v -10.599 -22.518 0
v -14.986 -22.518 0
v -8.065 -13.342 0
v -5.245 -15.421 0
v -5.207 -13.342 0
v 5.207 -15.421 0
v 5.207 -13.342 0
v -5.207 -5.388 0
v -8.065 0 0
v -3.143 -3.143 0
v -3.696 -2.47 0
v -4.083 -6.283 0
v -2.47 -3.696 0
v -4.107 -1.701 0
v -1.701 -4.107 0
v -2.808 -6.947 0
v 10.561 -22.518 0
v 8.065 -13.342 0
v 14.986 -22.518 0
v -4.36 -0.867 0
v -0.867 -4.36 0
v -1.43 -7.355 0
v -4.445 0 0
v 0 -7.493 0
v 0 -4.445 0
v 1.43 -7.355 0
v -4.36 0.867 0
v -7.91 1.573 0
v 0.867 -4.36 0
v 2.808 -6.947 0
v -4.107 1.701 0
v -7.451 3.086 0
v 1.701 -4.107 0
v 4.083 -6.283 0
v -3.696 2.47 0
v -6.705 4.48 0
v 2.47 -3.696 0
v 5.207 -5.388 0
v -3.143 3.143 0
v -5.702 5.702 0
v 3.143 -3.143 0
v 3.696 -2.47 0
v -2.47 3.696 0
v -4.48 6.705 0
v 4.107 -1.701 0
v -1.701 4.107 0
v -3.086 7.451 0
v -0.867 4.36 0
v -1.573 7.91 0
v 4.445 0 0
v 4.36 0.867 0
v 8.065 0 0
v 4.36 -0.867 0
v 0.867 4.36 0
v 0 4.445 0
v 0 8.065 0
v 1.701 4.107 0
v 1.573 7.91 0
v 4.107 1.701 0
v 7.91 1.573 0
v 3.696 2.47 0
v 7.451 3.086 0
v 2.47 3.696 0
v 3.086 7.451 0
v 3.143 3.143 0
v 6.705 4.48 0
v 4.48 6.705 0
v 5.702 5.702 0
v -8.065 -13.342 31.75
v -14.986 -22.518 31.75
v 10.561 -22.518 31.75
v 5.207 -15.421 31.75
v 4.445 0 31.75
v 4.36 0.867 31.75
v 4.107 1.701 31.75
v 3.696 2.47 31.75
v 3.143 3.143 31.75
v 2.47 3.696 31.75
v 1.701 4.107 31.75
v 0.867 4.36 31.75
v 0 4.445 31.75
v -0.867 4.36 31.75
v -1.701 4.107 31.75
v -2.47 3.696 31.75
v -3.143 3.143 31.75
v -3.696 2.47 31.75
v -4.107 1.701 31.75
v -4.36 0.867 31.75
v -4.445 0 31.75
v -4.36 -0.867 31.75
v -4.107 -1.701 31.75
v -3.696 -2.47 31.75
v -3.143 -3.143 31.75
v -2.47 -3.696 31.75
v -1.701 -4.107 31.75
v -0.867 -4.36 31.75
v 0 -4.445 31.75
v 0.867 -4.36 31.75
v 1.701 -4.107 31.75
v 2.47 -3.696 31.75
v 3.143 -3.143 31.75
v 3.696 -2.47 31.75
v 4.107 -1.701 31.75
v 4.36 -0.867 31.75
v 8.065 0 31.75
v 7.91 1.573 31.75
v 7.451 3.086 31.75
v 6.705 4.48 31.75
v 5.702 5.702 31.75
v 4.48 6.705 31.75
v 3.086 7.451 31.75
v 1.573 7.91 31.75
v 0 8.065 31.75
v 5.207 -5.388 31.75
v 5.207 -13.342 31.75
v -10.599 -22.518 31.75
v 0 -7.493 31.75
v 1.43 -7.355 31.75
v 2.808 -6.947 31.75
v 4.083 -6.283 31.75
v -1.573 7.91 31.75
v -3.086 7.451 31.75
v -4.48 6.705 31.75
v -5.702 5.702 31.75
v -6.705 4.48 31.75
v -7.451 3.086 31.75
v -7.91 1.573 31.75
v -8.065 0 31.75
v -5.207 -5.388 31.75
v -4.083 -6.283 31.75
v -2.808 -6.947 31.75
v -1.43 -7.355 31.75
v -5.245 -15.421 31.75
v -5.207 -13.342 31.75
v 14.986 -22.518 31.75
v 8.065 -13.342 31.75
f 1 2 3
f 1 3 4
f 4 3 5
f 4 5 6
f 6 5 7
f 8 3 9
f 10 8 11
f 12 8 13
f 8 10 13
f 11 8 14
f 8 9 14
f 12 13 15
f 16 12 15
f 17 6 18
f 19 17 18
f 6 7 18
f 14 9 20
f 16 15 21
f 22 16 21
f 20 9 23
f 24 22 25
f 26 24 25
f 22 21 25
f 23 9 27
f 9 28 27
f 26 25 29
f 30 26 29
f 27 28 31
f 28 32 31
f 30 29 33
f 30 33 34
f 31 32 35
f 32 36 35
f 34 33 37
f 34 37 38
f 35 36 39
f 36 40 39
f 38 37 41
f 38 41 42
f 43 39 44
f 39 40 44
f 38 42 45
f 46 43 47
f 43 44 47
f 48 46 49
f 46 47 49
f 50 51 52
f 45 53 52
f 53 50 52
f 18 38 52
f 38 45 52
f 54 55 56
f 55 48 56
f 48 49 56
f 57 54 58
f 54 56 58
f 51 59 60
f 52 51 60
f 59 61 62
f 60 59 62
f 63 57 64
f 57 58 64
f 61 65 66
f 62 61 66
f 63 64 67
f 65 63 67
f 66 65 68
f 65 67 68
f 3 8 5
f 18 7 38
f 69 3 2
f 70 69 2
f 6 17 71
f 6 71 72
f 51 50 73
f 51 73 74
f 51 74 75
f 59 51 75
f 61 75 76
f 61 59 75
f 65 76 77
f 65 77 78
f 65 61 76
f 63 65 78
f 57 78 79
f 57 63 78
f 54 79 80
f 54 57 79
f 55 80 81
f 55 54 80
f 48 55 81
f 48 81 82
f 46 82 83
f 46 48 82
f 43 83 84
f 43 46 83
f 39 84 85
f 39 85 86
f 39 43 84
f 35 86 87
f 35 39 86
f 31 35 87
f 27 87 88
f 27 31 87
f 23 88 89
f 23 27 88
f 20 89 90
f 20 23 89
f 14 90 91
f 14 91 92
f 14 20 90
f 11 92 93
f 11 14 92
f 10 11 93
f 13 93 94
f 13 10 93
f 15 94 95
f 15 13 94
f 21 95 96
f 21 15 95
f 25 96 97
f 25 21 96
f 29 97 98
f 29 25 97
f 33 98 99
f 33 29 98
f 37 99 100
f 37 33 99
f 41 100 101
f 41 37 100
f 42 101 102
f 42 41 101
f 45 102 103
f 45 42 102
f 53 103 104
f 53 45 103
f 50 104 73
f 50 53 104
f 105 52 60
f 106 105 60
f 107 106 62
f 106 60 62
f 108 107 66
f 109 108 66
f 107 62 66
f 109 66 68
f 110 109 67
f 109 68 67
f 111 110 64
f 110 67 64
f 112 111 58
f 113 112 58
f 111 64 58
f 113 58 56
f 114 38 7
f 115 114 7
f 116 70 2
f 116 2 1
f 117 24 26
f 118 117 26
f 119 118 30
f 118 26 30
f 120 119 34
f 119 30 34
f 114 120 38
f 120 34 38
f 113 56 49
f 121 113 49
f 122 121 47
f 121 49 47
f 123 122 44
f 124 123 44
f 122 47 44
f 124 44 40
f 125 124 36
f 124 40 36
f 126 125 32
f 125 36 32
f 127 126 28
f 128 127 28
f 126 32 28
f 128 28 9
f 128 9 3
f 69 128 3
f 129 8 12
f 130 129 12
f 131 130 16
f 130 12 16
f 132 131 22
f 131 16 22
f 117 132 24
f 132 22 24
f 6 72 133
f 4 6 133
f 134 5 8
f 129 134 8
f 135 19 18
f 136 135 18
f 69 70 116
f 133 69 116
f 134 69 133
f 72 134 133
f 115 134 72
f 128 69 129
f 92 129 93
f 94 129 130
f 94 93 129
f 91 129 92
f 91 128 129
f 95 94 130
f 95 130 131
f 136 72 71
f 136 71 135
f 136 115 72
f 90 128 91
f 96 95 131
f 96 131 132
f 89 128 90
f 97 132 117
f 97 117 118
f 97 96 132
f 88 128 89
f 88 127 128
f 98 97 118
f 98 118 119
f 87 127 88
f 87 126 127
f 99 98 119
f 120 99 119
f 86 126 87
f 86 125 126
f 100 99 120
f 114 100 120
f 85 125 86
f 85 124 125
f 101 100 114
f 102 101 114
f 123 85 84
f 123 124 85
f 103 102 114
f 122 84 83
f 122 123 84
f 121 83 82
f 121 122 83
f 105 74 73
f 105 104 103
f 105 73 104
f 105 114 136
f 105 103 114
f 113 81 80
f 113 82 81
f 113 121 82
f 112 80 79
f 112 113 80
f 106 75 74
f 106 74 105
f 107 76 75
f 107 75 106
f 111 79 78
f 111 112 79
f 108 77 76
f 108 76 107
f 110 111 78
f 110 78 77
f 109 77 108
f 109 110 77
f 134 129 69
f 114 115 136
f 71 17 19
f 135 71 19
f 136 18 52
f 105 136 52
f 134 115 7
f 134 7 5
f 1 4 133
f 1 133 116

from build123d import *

# Parameters (mm, degrees)
F0_R     = 4.445
F1_DEPTH = 31.75
F3_DEPTH = 31.751


with BuildPart() as f1:
    # F0 (on Top) → F1 (new body)
    with BuildSketch(Plane.XY):
        with BuildLine():
            ThreePointArc((8.0645, 0), (5.702463, 5.702463), (0, 8.0645))
            ThreePointArc((0, 8.0645), (-5.702463, 5.702463), (-8.0645, 0))
            Line((-8.0645, 0), (-8.0645, -13.342164))
            Line((-8.0645, -13.342164), (-14.986, -22.517859))
            Line((-14.986, -22.517859), (0, -22.517859))
            Line((0, -22.517859), (14.986, -22.517859))
            Line((14.986, -22.517859), (8.0645, -13.342164))
            Line((8.0645, -13.342164), (8.0645, 0))
        make_face()
        with BuildLine():
            Line((0, -13.342164), (-5.207, -13.342164))
            Line((-5.207, -13.342164), (-5.207, -5.388154))
            ThreePointArc((-5.207, -5.388154), (-2.808168, -6.946887), (0, -7.493))
            ThreePointArc((0, -7.493), (2.808168, -6.946887), (5.207, -5.388154))
            Line((5.207, -5.388154), (5.207, -13.342164))
            Line((5.207, -13.342164), (0, -13.342164))
        make_face(mode=Mode.SUBTRACT)
        Circle(F0_R, mode=Mode.SUBTRACT)
    extrude(amount=F1_DEPTH)

    # F2 (on face) → F3 (cut, through all)
    with BuildSketch(Plane.XY.offset(31.75)):
        Polygon((5.207, -15.420636), (-5.2451, -15.420636), (-10.598746, -22.517859), (10.560646, -22.517859), align=None)
    extrude(amount=-F3_DEPTH, mode=Mode.SUBTRACT)


solid = f1.part
